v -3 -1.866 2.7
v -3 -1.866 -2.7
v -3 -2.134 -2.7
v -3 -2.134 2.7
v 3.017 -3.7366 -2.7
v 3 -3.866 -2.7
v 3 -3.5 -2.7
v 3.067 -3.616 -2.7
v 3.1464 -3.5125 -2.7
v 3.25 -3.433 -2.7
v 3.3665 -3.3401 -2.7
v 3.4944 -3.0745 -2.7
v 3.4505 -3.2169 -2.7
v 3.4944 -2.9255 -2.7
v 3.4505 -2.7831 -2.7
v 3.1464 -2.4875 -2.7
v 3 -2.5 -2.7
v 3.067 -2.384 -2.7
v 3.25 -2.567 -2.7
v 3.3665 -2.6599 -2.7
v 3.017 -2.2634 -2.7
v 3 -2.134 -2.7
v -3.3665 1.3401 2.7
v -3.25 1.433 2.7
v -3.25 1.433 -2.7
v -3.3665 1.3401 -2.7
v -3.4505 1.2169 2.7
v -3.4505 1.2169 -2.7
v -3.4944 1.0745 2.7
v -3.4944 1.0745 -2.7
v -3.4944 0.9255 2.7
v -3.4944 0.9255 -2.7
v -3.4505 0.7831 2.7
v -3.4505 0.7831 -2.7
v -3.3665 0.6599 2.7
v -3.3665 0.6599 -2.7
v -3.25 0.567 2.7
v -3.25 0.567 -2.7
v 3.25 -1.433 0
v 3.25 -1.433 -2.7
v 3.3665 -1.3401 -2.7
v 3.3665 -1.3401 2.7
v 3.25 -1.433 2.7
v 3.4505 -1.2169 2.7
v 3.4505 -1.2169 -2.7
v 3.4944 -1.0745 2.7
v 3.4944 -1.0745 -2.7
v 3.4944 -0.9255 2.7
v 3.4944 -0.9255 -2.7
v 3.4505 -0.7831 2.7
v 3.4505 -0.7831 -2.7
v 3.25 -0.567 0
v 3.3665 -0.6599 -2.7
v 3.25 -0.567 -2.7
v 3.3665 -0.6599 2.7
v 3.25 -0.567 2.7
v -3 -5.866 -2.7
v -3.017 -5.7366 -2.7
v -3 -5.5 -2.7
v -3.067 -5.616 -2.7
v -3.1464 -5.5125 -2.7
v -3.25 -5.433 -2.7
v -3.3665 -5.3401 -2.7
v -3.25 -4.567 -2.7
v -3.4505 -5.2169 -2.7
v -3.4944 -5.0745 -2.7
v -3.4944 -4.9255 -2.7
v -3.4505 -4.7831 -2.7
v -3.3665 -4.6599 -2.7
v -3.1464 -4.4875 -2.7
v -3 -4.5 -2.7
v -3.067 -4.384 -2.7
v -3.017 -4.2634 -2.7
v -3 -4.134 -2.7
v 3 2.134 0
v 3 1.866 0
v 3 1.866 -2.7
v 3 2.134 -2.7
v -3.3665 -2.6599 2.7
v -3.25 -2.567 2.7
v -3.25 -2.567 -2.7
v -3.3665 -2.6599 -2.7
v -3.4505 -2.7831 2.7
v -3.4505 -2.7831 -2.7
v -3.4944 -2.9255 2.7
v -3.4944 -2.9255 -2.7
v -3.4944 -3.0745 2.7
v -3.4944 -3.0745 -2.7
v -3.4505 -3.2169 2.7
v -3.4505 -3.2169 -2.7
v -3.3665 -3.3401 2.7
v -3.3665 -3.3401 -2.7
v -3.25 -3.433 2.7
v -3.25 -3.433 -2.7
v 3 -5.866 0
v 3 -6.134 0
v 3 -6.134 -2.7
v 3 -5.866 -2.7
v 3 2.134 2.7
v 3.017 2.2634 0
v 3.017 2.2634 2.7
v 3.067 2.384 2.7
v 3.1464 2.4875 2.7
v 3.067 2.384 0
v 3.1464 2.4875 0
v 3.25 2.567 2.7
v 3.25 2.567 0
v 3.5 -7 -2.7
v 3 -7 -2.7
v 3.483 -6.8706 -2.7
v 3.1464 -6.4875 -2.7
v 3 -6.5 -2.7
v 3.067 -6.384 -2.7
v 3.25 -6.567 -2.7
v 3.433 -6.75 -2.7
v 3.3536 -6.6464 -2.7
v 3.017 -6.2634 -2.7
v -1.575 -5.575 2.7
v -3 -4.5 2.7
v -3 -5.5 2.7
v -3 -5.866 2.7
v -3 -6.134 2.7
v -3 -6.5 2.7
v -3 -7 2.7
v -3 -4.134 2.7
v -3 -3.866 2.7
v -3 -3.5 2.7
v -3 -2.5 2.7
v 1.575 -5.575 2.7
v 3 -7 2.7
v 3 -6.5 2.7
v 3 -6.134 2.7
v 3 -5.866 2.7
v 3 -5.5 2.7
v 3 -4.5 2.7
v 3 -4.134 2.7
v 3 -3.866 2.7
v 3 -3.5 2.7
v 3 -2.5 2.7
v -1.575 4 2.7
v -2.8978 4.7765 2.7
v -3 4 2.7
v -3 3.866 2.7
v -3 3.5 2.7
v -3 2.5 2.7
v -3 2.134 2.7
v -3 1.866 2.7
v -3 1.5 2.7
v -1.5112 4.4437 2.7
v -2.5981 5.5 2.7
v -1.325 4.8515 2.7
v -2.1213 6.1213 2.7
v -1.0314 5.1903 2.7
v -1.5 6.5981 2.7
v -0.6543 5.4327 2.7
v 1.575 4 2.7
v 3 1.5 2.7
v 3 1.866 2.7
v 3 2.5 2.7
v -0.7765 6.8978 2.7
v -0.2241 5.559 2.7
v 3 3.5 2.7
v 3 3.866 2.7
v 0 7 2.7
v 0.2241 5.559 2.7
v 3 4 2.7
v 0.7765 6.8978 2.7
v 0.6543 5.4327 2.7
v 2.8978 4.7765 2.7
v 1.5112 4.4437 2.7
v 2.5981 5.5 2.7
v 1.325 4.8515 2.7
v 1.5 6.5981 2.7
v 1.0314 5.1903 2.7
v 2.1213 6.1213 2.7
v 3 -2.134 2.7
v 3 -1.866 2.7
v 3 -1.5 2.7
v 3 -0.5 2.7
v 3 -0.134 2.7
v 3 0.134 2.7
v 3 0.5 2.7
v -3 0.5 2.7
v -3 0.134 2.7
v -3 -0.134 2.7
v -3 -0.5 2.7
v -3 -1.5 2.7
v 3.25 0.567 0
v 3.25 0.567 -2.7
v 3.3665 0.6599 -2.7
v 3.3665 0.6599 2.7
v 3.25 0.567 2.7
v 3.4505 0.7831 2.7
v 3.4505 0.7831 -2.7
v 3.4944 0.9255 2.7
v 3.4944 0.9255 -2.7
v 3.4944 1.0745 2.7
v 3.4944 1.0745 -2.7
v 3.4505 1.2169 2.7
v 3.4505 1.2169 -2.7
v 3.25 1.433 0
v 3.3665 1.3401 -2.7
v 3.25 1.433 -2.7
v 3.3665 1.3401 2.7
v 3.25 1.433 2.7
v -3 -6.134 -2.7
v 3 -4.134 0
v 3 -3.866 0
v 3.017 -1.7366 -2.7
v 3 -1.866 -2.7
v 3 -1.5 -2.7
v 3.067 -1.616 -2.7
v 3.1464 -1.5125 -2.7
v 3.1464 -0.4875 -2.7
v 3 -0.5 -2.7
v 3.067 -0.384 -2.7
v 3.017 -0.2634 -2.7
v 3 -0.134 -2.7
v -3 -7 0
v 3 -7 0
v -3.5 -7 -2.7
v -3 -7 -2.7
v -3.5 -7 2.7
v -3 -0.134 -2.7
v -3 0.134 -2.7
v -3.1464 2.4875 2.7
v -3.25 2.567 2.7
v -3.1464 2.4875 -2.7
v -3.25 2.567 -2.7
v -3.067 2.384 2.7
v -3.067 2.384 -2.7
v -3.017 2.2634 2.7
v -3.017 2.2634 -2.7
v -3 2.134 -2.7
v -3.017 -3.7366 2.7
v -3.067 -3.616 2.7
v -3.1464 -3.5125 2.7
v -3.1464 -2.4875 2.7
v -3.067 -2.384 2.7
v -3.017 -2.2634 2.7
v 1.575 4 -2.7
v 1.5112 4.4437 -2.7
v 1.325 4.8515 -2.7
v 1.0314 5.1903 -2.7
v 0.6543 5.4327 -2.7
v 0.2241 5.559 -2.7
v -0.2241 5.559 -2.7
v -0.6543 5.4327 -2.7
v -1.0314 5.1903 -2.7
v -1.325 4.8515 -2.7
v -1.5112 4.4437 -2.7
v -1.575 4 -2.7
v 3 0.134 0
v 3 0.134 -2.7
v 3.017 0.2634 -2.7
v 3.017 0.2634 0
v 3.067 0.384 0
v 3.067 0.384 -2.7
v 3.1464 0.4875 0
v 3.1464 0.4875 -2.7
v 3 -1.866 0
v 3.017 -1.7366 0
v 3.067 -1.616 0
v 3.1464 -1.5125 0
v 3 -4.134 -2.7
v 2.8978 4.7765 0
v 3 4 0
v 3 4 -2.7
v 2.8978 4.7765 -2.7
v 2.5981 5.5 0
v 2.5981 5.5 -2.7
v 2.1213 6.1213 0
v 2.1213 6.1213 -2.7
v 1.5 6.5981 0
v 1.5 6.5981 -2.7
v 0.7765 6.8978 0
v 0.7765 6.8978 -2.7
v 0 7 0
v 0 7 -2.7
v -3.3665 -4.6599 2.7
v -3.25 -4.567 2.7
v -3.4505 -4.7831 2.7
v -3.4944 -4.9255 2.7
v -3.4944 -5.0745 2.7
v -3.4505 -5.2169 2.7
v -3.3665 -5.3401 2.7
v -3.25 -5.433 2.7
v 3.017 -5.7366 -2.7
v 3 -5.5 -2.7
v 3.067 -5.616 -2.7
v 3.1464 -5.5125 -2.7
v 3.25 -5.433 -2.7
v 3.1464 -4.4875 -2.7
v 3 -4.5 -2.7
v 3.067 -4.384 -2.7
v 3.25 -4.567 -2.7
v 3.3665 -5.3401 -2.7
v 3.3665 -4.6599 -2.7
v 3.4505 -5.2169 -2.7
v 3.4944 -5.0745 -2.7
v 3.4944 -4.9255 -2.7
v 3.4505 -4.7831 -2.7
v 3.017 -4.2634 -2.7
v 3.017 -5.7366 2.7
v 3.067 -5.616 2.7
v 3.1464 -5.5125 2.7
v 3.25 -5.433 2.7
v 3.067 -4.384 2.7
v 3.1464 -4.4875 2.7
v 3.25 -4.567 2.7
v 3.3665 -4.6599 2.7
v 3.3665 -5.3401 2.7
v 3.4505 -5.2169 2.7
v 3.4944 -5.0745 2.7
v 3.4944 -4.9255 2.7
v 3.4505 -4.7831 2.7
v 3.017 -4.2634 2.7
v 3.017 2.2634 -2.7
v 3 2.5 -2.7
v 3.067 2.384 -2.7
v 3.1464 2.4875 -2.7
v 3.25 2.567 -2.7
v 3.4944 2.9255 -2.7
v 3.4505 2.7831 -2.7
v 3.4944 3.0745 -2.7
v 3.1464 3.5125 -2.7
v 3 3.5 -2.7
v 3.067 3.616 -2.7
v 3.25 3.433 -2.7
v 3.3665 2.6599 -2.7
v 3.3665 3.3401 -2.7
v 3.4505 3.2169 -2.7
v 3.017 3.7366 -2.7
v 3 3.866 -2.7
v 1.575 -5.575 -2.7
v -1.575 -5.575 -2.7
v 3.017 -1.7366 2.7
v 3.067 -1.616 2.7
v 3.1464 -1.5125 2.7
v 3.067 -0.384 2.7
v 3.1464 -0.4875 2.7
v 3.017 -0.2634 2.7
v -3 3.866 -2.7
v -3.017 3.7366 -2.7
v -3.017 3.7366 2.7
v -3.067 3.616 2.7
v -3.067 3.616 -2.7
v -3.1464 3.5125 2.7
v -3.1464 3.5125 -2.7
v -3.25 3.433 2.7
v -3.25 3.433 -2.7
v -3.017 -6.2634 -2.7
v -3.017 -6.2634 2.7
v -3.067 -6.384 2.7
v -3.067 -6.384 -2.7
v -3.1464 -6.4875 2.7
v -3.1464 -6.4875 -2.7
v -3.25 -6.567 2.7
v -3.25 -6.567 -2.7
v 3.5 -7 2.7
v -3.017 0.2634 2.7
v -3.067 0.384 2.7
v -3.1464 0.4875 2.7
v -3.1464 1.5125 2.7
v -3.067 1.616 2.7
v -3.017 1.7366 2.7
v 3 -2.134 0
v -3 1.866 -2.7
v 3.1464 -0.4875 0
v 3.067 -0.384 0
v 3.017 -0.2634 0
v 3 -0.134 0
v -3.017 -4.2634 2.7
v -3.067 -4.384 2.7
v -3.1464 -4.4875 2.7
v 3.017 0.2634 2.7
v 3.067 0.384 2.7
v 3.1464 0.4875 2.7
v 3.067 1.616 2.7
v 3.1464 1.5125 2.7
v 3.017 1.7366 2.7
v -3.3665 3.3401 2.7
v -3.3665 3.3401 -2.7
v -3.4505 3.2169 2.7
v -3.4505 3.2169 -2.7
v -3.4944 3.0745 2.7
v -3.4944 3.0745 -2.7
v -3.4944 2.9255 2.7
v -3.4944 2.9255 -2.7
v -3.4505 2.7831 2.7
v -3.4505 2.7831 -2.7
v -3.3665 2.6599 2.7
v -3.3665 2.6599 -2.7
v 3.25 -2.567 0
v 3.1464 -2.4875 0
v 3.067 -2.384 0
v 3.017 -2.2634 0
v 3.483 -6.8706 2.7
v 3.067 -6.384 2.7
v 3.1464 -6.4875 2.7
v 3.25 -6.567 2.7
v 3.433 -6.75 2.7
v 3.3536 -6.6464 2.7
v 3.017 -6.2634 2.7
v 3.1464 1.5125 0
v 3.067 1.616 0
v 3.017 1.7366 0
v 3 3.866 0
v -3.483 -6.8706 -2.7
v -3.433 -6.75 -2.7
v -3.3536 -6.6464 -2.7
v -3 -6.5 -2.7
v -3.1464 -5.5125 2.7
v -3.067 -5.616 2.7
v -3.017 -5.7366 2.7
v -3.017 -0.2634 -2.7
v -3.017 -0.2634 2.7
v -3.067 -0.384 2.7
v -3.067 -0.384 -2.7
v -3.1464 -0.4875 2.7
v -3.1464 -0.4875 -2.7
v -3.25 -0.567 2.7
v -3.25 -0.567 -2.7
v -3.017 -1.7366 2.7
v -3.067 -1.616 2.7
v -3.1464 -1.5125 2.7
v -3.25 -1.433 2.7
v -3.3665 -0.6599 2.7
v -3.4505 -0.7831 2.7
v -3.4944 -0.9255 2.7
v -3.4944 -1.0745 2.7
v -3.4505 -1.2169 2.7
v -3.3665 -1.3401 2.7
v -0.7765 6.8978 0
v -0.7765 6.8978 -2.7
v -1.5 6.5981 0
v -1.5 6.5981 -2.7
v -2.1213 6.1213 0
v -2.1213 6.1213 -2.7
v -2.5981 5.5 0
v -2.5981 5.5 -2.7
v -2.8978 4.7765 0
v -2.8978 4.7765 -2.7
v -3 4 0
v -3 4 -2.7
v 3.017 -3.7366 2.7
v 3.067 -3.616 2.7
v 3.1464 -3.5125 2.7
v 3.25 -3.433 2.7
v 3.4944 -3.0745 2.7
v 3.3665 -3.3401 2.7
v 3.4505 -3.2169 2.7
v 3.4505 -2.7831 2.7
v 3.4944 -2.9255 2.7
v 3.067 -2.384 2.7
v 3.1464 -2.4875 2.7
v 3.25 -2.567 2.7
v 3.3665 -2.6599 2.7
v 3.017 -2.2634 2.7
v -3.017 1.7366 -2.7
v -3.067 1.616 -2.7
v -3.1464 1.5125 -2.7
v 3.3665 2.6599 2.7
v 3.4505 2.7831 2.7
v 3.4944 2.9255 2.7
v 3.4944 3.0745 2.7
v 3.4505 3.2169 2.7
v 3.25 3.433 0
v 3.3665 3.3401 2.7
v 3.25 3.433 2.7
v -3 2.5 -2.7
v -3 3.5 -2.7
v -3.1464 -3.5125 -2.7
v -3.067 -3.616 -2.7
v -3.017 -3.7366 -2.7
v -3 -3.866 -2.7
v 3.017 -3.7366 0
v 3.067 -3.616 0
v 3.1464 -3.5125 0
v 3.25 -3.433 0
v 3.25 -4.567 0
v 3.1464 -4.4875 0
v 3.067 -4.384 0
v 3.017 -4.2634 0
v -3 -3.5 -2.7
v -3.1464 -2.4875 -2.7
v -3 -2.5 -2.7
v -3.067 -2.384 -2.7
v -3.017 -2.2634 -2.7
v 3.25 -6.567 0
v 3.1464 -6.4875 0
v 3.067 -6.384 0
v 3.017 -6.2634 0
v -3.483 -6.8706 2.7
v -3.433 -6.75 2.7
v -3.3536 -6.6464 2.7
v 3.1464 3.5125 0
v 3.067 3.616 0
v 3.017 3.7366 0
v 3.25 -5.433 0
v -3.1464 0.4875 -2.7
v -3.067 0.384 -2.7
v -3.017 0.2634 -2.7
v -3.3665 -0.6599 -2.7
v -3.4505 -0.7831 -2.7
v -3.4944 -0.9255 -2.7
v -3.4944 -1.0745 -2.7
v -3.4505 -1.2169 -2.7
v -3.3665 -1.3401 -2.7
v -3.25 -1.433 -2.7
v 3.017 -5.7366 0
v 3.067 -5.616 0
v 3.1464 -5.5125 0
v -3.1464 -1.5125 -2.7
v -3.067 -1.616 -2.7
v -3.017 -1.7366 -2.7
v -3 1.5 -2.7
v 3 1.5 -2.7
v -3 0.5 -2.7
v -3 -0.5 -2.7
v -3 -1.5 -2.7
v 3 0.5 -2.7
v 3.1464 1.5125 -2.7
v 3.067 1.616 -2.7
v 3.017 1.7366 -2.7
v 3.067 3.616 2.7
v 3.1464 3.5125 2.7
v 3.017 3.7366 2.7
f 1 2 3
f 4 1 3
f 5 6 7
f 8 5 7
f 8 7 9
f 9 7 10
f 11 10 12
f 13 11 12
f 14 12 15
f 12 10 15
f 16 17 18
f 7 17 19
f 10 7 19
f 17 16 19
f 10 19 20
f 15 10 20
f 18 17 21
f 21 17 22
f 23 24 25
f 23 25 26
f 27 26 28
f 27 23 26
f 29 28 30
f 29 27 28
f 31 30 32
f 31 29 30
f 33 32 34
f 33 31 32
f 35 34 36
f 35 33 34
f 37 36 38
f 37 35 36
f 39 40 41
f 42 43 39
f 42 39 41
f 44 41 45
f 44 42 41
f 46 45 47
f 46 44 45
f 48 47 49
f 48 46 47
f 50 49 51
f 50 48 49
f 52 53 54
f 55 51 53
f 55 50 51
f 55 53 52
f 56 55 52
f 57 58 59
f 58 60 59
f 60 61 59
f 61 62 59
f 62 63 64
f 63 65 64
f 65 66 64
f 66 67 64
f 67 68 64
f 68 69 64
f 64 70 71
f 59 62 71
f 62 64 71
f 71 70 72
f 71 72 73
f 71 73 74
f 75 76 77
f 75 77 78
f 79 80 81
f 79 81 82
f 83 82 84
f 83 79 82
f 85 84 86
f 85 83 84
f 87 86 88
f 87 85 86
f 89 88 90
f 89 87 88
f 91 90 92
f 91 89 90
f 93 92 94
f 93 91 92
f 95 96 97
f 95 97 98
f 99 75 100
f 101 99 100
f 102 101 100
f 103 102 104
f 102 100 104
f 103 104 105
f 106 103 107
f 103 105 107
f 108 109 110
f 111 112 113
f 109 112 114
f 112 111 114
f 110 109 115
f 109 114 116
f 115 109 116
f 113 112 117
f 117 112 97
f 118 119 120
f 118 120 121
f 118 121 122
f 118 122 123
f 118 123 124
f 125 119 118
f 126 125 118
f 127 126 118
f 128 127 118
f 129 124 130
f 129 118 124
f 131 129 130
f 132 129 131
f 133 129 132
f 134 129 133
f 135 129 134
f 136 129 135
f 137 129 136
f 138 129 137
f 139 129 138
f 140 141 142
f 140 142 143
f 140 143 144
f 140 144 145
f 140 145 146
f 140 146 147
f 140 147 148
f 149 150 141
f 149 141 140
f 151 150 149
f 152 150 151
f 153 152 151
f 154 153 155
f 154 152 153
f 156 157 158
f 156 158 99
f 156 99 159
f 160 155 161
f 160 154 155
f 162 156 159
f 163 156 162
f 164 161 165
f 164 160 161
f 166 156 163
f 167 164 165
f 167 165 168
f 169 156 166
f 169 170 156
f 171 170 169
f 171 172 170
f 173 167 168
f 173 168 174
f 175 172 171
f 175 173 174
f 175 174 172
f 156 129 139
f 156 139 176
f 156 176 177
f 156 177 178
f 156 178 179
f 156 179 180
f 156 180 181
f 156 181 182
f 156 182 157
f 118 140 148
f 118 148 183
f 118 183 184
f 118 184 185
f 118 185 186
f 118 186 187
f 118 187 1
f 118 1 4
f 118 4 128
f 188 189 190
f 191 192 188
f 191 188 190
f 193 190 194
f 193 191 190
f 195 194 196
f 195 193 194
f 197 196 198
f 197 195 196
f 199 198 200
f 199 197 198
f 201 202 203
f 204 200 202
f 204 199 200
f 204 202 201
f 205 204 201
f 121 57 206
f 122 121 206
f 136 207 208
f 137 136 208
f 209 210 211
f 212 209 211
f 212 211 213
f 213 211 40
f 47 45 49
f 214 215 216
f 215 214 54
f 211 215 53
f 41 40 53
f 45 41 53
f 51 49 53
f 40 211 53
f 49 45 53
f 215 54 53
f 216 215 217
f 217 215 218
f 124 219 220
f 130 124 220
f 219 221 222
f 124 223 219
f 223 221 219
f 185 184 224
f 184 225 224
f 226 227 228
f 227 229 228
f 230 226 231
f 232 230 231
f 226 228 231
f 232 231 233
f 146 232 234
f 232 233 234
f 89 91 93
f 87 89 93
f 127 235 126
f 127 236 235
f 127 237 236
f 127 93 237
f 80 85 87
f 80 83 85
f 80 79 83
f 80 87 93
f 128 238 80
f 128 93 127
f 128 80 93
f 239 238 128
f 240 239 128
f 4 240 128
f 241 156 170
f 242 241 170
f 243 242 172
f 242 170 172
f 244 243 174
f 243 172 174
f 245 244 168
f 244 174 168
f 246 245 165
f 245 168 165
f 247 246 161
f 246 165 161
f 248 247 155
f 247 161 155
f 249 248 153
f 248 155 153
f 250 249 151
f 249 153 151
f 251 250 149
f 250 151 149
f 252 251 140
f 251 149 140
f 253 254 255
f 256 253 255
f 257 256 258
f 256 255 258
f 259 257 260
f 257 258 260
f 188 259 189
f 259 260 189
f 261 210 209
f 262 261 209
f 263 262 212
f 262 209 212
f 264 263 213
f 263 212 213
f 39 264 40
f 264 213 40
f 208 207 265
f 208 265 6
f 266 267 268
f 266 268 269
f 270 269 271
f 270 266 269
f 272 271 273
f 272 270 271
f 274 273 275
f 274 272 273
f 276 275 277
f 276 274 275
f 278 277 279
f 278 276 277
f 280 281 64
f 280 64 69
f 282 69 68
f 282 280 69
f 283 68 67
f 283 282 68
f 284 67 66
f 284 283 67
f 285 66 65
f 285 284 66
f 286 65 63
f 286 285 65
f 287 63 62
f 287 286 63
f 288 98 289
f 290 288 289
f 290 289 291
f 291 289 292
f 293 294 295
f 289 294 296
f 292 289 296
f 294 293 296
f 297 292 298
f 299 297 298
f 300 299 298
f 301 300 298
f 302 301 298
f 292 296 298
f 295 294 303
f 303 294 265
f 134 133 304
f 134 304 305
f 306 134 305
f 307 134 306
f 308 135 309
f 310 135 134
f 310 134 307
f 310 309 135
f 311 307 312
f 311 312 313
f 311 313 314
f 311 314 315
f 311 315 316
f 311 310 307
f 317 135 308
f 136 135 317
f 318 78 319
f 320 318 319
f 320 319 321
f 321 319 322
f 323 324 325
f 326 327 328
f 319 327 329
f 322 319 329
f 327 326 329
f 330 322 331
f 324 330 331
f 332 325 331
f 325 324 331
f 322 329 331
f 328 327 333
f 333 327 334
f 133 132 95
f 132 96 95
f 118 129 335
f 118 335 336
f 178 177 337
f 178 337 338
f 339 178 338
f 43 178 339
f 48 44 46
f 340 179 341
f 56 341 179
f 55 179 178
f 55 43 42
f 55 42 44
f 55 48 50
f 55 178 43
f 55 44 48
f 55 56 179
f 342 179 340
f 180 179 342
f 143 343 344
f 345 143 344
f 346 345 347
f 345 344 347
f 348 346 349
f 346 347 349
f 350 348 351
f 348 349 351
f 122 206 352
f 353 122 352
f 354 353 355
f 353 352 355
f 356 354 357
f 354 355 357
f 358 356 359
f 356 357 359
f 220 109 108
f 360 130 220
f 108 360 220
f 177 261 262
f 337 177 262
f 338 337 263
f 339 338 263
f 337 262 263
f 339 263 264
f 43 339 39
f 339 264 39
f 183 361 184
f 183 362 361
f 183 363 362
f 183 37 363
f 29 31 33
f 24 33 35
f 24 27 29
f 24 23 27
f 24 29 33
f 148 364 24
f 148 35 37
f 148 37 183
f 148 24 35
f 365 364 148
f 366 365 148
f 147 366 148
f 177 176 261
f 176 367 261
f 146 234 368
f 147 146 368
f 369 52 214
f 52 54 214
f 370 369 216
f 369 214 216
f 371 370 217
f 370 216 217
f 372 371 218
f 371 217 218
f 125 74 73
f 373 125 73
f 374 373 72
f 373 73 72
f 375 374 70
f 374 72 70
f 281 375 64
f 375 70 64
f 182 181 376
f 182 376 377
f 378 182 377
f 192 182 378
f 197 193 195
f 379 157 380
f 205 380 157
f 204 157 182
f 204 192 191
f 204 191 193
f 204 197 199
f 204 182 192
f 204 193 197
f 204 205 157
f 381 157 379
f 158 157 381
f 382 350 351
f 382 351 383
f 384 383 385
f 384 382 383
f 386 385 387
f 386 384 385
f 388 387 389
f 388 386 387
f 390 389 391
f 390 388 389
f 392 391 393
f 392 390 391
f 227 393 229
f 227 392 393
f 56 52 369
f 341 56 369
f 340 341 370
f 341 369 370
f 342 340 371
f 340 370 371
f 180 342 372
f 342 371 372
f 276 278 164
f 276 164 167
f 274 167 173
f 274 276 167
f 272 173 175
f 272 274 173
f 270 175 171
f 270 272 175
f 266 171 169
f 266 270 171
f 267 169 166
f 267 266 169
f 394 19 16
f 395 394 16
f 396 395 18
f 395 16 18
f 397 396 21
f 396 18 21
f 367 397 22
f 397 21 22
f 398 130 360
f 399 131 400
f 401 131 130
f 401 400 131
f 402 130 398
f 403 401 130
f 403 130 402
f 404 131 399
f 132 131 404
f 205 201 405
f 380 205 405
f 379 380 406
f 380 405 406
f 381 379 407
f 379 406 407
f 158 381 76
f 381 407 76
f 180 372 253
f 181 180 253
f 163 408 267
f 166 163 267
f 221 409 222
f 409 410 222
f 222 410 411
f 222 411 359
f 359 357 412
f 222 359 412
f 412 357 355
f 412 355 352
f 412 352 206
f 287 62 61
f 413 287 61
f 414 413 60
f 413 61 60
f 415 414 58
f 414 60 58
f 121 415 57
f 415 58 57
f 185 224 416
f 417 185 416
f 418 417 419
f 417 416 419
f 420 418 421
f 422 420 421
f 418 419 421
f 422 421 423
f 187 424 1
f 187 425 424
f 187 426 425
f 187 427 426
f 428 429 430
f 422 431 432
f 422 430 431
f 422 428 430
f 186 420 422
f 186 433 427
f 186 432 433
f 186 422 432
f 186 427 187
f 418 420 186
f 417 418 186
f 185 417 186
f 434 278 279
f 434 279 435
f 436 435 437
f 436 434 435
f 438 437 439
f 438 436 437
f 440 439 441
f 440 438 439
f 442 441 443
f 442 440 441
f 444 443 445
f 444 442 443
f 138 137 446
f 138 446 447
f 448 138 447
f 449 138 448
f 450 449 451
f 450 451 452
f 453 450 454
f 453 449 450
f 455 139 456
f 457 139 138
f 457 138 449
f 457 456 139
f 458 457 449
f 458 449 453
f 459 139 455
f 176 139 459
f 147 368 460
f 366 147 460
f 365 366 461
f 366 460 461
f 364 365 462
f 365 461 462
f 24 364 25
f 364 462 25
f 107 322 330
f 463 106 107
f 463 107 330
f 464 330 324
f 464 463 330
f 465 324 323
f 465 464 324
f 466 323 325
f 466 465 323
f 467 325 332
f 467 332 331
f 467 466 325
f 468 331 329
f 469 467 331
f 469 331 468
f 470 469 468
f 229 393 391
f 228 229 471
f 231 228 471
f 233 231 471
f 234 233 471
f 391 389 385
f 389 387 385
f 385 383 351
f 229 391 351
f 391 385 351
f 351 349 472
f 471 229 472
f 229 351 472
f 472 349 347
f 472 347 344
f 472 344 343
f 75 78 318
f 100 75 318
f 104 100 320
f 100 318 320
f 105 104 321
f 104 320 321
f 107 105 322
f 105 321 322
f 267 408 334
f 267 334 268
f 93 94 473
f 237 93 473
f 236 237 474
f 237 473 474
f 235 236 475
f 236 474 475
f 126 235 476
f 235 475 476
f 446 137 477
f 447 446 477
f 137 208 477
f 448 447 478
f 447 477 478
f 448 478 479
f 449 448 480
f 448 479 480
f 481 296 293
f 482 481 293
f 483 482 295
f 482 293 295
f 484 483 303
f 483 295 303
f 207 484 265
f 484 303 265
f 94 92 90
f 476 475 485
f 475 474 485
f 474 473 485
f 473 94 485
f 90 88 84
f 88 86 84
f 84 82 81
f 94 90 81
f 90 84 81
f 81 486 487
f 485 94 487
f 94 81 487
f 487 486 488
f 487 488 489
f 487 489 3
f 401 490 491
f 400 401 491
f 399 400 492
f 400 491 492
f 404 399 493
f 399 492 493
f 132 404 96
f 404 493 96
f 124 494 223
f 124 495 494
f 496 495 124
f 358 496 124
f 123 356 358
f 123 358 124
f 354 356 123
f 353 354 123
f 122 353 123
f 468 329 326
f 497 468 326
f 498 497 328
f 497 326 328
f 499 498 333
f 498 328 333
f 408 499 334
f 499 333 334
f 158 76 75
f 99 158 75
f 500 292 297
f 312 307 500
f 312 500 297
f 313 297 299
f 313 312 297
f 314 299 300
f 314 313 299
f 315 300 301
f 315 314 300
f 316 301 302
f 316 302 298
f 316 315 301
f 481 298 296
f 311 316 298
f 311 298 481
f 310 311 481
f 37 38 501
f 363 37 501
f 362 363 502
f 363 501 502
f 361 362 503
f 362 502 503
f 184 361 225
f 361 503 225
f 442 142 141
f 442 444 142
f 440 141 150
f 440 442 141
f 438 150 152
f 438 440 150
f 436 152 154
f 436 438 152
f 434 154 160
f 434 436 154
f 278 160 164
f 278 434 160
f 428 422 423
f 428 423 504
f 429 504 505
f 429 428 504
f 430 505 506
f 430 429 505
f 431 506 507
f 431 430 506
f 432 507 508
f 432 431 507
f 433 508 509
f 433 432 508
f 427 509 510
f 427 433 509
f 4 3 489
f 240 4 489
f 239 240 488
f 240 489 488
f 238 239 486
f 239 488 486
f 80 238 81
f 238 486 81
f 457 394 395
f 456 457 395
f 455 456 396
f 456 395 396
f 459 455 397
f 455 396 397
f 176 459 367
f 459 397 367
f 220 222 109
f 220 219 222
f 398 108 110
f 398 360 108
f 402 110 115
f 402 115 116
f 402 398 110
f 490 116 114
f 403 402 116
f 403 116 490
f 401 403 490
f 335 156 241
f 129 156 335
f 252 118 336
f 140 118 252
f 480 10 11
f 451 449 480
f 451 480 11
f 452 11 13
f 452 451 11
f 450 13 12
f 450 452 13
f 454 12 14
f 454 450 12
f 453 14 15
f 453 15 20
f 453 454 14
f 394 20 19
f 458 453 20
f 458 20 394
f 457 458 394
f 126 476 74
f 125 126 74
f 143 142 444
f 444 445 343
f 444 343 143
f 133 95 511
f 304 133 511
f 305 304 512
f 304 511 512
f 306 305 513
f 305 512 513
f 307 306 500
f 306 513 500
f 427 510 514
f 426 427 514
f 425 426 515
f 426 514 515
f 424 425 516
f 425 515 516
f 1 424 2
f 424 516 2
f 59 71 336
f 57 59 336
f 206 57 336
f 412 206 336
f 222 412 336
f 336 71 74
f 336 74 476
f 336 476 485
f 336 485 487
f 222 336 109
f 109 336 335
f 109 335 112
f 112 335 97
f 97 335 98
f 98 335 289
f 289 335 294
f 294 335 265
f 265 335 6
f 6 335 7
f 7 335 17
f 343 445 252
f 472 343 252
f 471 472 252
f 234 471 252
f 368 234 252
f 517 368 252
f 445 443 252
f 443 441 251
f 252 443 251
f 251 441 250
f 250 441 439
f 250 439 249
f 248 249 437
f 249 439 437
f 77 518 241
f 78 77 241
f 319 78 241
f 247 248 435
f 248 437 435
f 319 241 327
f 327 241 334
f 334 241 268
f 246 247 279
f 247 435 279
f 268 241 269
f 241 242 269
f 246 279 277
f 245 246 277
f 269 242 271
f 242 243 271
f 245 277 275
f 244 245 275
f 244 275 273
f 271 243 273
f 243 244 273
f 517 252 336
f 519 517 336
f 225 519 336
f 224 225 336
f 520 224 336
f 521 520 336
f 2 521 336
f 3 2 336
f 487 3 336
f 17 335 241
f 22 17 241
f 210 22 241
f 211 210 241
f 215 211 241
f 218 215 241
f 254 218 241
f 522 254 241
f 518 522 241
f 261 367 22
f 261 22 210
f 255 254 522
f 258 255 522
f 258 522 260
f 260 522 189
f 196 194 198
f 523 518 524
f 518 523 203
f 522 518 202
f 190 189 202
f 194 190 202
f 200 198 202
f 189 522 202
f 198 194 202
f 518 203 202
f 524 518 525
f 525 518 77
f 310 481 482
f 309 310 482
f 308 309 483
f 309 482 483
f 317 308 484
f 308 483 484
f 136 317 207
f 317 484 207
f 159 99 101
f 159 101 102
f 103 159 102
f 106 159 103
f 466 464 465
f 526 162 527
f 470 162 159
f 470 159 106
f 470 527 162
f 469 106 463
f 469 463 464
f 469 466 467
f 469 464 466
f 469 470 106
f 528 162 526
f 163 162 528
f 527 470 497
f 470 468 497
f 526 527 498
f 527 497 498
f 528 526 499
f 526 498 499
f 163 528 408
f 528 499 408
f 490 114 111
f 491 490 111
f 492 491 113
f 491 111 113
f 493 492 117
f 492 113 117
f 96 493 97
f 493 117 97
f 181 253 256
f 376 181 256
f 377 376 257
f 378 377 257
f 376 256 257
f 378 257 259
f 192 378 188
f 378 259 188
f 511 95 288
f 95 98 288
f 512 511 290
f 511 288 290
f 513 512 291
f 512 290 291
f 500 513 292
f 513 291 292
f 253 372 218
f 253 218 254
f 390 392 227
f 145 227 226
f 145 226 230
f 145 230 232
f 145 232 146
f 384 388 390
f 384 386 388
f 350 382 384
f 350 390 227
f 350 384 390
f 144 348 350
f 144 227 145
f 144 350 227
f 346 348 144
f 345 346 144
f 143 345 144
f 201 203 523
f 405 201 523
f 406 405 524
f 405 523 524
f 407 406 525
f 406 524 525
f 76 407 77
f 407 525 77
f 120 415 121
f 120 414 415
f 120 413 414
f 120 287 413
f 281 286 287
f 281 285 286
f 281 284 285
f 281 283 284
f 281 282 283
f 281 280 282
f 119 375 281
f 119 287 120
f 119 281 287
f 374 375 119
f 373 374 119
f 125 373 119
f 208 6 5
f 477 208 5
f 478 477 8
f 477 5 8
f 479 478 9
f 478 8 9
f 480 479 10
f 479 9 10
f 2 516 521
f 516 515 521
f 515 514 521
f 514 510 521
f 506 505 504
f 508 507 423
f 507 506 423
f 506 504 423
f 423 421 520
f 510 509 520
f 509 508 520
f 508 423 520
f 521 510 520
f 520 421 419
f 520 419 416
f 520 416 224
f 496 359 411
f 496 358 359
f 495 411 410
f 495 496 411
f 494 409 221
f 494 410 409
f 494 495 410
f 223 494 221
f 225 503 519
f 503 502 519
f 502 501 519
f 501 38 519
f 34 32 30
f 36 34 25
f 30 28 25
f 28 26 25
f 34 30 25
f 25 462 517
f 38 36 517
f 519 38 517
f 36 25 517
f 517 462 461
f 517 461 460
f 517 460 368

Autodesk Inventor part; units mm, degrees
ref_plane "YZ Plane" through (0, 0, 0) normal (1, 0, 0) x (0, 1, 0)
ref_plane "XZ Plane" through (0, 0, 0) normal (0, 1, 0) x (-1, 0, 0)
sketch "Esquisse1" plane through (0, 0, 0) normal (0, 0, 1) x (1, 0, 0)
  line L0 (-3, -7) -> (3, -7)
  line L1 (3, -7) -> (3, 4)
  line L2 (0, 7) -> (0, 7)
  line L3 (-3, 4) -> (-3, -7)
  line L4 (-3, -7) -> (3, 7) construction
  line L5 (3, -7) -> (-3, 7) construction
  arc A0 (0, 7) -> (-3, 4) centre (0, 4) ccw
  arc A1 (3, 4) -> (0, 7) centre (0, 4) ccw
  point P0 (0, 0)
  dimension "d0" = 6
  dimension "d1" = 14
  dimension "d2" = 3
extrude "Extrusion1" add sketch "Esquisse1" along normal mid plane 5.4
sketch "Esquisse2" plane through (0, 0, 2.7) normal (0, 0, 1) x (1, 0, 0)
  line L0 (-3, -7) -> (3, -7) construction
  line L1 (3, -7) -> (3, 4) construction
  arc A0 (3, 4) -> (-3, 4) centre (0, 4) ccw construction
  line L2 (-3, 4) -> (-3, -7) construction
  arc A1 (1.575, 4) -> (-1.575, 4) centre (0, 4) ccw
  line L3 (1.575, 4) -> (1.575, -5.575)
  line L4 (1.575, -5.575) -> (-1.575, -5.575)
  line L5 (-1.575, -5.575) -> (-1.575, 4)
  point P0 (0, 0)
  dimension "d21" = 3.15
extrude "Extrusion2" cut sketch "Esquisse2" against normal through all
sketch "Esquisse3" plane through (0, 0, 2.7) normal (0, 0, 1) x (1, 0, 0)
  line L0 (3, 4) -> (3, -7) projected
  arc A0 (3.5, -7) -> (3, -6.5) centre (3, -7) ccw
  line L1 (-3, -7) -> (3, -7) projected
  line L2 (3, -7) -> (3.5, -7)
  line L3 (3, -7) -> (3, -6.5)
  arc A1 (3, -5.5) -> (3, -4.5) centre (3, -5) ccw
  arc A2 (3, -3.5) -> (3, -2.5) centre (3, -3) ccw
  arc A3 (3, -1.5) -> (3, -0.5) centre (3, -1) ccw
  arc A4 (3, 0.5) -> (3, 1.5) centre (3, 1) ccw
  arc A5 (3, 2.5) -> (3, 3.5) centre (3, 3) ccw
  line L4 (3, -5.5) -> (3, -4.5)
  line L5 (3, -3.5) -> (3, -2.5)
  line L6 (3, -1.5) -> (3, -0.5)
  line L7 (3, 0.5) -> (3, 1.5)
  line L8 (3, 2.5) -> (3, 3.5)
  point P0 (0, 0)
  dimension "d8" = 1
  dimension "d9" = 1
  dimension "d10" = 2
  dimension "d13" = 2
extrude "Extrusion3" add sketch "Esquisse3" against normal up to surface (5.4 mm away)
mirror "Symétrie1" about plane through (0, 0, 0) normal (1, 0, 0) of "Extrusion3"
fillet "Congé1" radius 0.5 33 edges at (3, -6.5, -1.35) (3, -6.5, 1.35) (3, -5.5, -1.35) (3, -4.5, -1.35) (3, -5.5, 1.35) (3, -4.5, 1.35) (3, -3.5, -1.35) (3, -2.5, -1.35) (3, -3.5, 1.35) (3, -2.5, 1.35) (3, -1.5, -1.35) (3, -0.5, -1.35) (3, -1.5, 1.35) (3, -0.5, 1.35) (3, 0.5, -1.35) (3, 1.5, -1.35) (3, 0.5, 1.35) (3, 1.5, 1.35) (3, 2.5, -1.35) (3, 3.5, -1.35) (3, 2.5, 1.35) (3, 3.5, 1.35) (-3, -6.5, 0) (-3, -4.5, 0) (-3, -5.5, 0) (-3, -2.5, 0) (-3, -3.5, 0) (-3, -0.5, 0) (-3, -1.5, 0) (-3, 1.5, 0) (-3, 0.5, 0) (-3, 3.5, 0) (-3, 2.5, 0)
ref_plane "Plan de construction1" through (3.5, 4, -2.7) normal (0, -1, 0) x (1, 0, 0)
equation "\"d9\" = d8"
properties part number "Tendeur" material "Aluminium"
